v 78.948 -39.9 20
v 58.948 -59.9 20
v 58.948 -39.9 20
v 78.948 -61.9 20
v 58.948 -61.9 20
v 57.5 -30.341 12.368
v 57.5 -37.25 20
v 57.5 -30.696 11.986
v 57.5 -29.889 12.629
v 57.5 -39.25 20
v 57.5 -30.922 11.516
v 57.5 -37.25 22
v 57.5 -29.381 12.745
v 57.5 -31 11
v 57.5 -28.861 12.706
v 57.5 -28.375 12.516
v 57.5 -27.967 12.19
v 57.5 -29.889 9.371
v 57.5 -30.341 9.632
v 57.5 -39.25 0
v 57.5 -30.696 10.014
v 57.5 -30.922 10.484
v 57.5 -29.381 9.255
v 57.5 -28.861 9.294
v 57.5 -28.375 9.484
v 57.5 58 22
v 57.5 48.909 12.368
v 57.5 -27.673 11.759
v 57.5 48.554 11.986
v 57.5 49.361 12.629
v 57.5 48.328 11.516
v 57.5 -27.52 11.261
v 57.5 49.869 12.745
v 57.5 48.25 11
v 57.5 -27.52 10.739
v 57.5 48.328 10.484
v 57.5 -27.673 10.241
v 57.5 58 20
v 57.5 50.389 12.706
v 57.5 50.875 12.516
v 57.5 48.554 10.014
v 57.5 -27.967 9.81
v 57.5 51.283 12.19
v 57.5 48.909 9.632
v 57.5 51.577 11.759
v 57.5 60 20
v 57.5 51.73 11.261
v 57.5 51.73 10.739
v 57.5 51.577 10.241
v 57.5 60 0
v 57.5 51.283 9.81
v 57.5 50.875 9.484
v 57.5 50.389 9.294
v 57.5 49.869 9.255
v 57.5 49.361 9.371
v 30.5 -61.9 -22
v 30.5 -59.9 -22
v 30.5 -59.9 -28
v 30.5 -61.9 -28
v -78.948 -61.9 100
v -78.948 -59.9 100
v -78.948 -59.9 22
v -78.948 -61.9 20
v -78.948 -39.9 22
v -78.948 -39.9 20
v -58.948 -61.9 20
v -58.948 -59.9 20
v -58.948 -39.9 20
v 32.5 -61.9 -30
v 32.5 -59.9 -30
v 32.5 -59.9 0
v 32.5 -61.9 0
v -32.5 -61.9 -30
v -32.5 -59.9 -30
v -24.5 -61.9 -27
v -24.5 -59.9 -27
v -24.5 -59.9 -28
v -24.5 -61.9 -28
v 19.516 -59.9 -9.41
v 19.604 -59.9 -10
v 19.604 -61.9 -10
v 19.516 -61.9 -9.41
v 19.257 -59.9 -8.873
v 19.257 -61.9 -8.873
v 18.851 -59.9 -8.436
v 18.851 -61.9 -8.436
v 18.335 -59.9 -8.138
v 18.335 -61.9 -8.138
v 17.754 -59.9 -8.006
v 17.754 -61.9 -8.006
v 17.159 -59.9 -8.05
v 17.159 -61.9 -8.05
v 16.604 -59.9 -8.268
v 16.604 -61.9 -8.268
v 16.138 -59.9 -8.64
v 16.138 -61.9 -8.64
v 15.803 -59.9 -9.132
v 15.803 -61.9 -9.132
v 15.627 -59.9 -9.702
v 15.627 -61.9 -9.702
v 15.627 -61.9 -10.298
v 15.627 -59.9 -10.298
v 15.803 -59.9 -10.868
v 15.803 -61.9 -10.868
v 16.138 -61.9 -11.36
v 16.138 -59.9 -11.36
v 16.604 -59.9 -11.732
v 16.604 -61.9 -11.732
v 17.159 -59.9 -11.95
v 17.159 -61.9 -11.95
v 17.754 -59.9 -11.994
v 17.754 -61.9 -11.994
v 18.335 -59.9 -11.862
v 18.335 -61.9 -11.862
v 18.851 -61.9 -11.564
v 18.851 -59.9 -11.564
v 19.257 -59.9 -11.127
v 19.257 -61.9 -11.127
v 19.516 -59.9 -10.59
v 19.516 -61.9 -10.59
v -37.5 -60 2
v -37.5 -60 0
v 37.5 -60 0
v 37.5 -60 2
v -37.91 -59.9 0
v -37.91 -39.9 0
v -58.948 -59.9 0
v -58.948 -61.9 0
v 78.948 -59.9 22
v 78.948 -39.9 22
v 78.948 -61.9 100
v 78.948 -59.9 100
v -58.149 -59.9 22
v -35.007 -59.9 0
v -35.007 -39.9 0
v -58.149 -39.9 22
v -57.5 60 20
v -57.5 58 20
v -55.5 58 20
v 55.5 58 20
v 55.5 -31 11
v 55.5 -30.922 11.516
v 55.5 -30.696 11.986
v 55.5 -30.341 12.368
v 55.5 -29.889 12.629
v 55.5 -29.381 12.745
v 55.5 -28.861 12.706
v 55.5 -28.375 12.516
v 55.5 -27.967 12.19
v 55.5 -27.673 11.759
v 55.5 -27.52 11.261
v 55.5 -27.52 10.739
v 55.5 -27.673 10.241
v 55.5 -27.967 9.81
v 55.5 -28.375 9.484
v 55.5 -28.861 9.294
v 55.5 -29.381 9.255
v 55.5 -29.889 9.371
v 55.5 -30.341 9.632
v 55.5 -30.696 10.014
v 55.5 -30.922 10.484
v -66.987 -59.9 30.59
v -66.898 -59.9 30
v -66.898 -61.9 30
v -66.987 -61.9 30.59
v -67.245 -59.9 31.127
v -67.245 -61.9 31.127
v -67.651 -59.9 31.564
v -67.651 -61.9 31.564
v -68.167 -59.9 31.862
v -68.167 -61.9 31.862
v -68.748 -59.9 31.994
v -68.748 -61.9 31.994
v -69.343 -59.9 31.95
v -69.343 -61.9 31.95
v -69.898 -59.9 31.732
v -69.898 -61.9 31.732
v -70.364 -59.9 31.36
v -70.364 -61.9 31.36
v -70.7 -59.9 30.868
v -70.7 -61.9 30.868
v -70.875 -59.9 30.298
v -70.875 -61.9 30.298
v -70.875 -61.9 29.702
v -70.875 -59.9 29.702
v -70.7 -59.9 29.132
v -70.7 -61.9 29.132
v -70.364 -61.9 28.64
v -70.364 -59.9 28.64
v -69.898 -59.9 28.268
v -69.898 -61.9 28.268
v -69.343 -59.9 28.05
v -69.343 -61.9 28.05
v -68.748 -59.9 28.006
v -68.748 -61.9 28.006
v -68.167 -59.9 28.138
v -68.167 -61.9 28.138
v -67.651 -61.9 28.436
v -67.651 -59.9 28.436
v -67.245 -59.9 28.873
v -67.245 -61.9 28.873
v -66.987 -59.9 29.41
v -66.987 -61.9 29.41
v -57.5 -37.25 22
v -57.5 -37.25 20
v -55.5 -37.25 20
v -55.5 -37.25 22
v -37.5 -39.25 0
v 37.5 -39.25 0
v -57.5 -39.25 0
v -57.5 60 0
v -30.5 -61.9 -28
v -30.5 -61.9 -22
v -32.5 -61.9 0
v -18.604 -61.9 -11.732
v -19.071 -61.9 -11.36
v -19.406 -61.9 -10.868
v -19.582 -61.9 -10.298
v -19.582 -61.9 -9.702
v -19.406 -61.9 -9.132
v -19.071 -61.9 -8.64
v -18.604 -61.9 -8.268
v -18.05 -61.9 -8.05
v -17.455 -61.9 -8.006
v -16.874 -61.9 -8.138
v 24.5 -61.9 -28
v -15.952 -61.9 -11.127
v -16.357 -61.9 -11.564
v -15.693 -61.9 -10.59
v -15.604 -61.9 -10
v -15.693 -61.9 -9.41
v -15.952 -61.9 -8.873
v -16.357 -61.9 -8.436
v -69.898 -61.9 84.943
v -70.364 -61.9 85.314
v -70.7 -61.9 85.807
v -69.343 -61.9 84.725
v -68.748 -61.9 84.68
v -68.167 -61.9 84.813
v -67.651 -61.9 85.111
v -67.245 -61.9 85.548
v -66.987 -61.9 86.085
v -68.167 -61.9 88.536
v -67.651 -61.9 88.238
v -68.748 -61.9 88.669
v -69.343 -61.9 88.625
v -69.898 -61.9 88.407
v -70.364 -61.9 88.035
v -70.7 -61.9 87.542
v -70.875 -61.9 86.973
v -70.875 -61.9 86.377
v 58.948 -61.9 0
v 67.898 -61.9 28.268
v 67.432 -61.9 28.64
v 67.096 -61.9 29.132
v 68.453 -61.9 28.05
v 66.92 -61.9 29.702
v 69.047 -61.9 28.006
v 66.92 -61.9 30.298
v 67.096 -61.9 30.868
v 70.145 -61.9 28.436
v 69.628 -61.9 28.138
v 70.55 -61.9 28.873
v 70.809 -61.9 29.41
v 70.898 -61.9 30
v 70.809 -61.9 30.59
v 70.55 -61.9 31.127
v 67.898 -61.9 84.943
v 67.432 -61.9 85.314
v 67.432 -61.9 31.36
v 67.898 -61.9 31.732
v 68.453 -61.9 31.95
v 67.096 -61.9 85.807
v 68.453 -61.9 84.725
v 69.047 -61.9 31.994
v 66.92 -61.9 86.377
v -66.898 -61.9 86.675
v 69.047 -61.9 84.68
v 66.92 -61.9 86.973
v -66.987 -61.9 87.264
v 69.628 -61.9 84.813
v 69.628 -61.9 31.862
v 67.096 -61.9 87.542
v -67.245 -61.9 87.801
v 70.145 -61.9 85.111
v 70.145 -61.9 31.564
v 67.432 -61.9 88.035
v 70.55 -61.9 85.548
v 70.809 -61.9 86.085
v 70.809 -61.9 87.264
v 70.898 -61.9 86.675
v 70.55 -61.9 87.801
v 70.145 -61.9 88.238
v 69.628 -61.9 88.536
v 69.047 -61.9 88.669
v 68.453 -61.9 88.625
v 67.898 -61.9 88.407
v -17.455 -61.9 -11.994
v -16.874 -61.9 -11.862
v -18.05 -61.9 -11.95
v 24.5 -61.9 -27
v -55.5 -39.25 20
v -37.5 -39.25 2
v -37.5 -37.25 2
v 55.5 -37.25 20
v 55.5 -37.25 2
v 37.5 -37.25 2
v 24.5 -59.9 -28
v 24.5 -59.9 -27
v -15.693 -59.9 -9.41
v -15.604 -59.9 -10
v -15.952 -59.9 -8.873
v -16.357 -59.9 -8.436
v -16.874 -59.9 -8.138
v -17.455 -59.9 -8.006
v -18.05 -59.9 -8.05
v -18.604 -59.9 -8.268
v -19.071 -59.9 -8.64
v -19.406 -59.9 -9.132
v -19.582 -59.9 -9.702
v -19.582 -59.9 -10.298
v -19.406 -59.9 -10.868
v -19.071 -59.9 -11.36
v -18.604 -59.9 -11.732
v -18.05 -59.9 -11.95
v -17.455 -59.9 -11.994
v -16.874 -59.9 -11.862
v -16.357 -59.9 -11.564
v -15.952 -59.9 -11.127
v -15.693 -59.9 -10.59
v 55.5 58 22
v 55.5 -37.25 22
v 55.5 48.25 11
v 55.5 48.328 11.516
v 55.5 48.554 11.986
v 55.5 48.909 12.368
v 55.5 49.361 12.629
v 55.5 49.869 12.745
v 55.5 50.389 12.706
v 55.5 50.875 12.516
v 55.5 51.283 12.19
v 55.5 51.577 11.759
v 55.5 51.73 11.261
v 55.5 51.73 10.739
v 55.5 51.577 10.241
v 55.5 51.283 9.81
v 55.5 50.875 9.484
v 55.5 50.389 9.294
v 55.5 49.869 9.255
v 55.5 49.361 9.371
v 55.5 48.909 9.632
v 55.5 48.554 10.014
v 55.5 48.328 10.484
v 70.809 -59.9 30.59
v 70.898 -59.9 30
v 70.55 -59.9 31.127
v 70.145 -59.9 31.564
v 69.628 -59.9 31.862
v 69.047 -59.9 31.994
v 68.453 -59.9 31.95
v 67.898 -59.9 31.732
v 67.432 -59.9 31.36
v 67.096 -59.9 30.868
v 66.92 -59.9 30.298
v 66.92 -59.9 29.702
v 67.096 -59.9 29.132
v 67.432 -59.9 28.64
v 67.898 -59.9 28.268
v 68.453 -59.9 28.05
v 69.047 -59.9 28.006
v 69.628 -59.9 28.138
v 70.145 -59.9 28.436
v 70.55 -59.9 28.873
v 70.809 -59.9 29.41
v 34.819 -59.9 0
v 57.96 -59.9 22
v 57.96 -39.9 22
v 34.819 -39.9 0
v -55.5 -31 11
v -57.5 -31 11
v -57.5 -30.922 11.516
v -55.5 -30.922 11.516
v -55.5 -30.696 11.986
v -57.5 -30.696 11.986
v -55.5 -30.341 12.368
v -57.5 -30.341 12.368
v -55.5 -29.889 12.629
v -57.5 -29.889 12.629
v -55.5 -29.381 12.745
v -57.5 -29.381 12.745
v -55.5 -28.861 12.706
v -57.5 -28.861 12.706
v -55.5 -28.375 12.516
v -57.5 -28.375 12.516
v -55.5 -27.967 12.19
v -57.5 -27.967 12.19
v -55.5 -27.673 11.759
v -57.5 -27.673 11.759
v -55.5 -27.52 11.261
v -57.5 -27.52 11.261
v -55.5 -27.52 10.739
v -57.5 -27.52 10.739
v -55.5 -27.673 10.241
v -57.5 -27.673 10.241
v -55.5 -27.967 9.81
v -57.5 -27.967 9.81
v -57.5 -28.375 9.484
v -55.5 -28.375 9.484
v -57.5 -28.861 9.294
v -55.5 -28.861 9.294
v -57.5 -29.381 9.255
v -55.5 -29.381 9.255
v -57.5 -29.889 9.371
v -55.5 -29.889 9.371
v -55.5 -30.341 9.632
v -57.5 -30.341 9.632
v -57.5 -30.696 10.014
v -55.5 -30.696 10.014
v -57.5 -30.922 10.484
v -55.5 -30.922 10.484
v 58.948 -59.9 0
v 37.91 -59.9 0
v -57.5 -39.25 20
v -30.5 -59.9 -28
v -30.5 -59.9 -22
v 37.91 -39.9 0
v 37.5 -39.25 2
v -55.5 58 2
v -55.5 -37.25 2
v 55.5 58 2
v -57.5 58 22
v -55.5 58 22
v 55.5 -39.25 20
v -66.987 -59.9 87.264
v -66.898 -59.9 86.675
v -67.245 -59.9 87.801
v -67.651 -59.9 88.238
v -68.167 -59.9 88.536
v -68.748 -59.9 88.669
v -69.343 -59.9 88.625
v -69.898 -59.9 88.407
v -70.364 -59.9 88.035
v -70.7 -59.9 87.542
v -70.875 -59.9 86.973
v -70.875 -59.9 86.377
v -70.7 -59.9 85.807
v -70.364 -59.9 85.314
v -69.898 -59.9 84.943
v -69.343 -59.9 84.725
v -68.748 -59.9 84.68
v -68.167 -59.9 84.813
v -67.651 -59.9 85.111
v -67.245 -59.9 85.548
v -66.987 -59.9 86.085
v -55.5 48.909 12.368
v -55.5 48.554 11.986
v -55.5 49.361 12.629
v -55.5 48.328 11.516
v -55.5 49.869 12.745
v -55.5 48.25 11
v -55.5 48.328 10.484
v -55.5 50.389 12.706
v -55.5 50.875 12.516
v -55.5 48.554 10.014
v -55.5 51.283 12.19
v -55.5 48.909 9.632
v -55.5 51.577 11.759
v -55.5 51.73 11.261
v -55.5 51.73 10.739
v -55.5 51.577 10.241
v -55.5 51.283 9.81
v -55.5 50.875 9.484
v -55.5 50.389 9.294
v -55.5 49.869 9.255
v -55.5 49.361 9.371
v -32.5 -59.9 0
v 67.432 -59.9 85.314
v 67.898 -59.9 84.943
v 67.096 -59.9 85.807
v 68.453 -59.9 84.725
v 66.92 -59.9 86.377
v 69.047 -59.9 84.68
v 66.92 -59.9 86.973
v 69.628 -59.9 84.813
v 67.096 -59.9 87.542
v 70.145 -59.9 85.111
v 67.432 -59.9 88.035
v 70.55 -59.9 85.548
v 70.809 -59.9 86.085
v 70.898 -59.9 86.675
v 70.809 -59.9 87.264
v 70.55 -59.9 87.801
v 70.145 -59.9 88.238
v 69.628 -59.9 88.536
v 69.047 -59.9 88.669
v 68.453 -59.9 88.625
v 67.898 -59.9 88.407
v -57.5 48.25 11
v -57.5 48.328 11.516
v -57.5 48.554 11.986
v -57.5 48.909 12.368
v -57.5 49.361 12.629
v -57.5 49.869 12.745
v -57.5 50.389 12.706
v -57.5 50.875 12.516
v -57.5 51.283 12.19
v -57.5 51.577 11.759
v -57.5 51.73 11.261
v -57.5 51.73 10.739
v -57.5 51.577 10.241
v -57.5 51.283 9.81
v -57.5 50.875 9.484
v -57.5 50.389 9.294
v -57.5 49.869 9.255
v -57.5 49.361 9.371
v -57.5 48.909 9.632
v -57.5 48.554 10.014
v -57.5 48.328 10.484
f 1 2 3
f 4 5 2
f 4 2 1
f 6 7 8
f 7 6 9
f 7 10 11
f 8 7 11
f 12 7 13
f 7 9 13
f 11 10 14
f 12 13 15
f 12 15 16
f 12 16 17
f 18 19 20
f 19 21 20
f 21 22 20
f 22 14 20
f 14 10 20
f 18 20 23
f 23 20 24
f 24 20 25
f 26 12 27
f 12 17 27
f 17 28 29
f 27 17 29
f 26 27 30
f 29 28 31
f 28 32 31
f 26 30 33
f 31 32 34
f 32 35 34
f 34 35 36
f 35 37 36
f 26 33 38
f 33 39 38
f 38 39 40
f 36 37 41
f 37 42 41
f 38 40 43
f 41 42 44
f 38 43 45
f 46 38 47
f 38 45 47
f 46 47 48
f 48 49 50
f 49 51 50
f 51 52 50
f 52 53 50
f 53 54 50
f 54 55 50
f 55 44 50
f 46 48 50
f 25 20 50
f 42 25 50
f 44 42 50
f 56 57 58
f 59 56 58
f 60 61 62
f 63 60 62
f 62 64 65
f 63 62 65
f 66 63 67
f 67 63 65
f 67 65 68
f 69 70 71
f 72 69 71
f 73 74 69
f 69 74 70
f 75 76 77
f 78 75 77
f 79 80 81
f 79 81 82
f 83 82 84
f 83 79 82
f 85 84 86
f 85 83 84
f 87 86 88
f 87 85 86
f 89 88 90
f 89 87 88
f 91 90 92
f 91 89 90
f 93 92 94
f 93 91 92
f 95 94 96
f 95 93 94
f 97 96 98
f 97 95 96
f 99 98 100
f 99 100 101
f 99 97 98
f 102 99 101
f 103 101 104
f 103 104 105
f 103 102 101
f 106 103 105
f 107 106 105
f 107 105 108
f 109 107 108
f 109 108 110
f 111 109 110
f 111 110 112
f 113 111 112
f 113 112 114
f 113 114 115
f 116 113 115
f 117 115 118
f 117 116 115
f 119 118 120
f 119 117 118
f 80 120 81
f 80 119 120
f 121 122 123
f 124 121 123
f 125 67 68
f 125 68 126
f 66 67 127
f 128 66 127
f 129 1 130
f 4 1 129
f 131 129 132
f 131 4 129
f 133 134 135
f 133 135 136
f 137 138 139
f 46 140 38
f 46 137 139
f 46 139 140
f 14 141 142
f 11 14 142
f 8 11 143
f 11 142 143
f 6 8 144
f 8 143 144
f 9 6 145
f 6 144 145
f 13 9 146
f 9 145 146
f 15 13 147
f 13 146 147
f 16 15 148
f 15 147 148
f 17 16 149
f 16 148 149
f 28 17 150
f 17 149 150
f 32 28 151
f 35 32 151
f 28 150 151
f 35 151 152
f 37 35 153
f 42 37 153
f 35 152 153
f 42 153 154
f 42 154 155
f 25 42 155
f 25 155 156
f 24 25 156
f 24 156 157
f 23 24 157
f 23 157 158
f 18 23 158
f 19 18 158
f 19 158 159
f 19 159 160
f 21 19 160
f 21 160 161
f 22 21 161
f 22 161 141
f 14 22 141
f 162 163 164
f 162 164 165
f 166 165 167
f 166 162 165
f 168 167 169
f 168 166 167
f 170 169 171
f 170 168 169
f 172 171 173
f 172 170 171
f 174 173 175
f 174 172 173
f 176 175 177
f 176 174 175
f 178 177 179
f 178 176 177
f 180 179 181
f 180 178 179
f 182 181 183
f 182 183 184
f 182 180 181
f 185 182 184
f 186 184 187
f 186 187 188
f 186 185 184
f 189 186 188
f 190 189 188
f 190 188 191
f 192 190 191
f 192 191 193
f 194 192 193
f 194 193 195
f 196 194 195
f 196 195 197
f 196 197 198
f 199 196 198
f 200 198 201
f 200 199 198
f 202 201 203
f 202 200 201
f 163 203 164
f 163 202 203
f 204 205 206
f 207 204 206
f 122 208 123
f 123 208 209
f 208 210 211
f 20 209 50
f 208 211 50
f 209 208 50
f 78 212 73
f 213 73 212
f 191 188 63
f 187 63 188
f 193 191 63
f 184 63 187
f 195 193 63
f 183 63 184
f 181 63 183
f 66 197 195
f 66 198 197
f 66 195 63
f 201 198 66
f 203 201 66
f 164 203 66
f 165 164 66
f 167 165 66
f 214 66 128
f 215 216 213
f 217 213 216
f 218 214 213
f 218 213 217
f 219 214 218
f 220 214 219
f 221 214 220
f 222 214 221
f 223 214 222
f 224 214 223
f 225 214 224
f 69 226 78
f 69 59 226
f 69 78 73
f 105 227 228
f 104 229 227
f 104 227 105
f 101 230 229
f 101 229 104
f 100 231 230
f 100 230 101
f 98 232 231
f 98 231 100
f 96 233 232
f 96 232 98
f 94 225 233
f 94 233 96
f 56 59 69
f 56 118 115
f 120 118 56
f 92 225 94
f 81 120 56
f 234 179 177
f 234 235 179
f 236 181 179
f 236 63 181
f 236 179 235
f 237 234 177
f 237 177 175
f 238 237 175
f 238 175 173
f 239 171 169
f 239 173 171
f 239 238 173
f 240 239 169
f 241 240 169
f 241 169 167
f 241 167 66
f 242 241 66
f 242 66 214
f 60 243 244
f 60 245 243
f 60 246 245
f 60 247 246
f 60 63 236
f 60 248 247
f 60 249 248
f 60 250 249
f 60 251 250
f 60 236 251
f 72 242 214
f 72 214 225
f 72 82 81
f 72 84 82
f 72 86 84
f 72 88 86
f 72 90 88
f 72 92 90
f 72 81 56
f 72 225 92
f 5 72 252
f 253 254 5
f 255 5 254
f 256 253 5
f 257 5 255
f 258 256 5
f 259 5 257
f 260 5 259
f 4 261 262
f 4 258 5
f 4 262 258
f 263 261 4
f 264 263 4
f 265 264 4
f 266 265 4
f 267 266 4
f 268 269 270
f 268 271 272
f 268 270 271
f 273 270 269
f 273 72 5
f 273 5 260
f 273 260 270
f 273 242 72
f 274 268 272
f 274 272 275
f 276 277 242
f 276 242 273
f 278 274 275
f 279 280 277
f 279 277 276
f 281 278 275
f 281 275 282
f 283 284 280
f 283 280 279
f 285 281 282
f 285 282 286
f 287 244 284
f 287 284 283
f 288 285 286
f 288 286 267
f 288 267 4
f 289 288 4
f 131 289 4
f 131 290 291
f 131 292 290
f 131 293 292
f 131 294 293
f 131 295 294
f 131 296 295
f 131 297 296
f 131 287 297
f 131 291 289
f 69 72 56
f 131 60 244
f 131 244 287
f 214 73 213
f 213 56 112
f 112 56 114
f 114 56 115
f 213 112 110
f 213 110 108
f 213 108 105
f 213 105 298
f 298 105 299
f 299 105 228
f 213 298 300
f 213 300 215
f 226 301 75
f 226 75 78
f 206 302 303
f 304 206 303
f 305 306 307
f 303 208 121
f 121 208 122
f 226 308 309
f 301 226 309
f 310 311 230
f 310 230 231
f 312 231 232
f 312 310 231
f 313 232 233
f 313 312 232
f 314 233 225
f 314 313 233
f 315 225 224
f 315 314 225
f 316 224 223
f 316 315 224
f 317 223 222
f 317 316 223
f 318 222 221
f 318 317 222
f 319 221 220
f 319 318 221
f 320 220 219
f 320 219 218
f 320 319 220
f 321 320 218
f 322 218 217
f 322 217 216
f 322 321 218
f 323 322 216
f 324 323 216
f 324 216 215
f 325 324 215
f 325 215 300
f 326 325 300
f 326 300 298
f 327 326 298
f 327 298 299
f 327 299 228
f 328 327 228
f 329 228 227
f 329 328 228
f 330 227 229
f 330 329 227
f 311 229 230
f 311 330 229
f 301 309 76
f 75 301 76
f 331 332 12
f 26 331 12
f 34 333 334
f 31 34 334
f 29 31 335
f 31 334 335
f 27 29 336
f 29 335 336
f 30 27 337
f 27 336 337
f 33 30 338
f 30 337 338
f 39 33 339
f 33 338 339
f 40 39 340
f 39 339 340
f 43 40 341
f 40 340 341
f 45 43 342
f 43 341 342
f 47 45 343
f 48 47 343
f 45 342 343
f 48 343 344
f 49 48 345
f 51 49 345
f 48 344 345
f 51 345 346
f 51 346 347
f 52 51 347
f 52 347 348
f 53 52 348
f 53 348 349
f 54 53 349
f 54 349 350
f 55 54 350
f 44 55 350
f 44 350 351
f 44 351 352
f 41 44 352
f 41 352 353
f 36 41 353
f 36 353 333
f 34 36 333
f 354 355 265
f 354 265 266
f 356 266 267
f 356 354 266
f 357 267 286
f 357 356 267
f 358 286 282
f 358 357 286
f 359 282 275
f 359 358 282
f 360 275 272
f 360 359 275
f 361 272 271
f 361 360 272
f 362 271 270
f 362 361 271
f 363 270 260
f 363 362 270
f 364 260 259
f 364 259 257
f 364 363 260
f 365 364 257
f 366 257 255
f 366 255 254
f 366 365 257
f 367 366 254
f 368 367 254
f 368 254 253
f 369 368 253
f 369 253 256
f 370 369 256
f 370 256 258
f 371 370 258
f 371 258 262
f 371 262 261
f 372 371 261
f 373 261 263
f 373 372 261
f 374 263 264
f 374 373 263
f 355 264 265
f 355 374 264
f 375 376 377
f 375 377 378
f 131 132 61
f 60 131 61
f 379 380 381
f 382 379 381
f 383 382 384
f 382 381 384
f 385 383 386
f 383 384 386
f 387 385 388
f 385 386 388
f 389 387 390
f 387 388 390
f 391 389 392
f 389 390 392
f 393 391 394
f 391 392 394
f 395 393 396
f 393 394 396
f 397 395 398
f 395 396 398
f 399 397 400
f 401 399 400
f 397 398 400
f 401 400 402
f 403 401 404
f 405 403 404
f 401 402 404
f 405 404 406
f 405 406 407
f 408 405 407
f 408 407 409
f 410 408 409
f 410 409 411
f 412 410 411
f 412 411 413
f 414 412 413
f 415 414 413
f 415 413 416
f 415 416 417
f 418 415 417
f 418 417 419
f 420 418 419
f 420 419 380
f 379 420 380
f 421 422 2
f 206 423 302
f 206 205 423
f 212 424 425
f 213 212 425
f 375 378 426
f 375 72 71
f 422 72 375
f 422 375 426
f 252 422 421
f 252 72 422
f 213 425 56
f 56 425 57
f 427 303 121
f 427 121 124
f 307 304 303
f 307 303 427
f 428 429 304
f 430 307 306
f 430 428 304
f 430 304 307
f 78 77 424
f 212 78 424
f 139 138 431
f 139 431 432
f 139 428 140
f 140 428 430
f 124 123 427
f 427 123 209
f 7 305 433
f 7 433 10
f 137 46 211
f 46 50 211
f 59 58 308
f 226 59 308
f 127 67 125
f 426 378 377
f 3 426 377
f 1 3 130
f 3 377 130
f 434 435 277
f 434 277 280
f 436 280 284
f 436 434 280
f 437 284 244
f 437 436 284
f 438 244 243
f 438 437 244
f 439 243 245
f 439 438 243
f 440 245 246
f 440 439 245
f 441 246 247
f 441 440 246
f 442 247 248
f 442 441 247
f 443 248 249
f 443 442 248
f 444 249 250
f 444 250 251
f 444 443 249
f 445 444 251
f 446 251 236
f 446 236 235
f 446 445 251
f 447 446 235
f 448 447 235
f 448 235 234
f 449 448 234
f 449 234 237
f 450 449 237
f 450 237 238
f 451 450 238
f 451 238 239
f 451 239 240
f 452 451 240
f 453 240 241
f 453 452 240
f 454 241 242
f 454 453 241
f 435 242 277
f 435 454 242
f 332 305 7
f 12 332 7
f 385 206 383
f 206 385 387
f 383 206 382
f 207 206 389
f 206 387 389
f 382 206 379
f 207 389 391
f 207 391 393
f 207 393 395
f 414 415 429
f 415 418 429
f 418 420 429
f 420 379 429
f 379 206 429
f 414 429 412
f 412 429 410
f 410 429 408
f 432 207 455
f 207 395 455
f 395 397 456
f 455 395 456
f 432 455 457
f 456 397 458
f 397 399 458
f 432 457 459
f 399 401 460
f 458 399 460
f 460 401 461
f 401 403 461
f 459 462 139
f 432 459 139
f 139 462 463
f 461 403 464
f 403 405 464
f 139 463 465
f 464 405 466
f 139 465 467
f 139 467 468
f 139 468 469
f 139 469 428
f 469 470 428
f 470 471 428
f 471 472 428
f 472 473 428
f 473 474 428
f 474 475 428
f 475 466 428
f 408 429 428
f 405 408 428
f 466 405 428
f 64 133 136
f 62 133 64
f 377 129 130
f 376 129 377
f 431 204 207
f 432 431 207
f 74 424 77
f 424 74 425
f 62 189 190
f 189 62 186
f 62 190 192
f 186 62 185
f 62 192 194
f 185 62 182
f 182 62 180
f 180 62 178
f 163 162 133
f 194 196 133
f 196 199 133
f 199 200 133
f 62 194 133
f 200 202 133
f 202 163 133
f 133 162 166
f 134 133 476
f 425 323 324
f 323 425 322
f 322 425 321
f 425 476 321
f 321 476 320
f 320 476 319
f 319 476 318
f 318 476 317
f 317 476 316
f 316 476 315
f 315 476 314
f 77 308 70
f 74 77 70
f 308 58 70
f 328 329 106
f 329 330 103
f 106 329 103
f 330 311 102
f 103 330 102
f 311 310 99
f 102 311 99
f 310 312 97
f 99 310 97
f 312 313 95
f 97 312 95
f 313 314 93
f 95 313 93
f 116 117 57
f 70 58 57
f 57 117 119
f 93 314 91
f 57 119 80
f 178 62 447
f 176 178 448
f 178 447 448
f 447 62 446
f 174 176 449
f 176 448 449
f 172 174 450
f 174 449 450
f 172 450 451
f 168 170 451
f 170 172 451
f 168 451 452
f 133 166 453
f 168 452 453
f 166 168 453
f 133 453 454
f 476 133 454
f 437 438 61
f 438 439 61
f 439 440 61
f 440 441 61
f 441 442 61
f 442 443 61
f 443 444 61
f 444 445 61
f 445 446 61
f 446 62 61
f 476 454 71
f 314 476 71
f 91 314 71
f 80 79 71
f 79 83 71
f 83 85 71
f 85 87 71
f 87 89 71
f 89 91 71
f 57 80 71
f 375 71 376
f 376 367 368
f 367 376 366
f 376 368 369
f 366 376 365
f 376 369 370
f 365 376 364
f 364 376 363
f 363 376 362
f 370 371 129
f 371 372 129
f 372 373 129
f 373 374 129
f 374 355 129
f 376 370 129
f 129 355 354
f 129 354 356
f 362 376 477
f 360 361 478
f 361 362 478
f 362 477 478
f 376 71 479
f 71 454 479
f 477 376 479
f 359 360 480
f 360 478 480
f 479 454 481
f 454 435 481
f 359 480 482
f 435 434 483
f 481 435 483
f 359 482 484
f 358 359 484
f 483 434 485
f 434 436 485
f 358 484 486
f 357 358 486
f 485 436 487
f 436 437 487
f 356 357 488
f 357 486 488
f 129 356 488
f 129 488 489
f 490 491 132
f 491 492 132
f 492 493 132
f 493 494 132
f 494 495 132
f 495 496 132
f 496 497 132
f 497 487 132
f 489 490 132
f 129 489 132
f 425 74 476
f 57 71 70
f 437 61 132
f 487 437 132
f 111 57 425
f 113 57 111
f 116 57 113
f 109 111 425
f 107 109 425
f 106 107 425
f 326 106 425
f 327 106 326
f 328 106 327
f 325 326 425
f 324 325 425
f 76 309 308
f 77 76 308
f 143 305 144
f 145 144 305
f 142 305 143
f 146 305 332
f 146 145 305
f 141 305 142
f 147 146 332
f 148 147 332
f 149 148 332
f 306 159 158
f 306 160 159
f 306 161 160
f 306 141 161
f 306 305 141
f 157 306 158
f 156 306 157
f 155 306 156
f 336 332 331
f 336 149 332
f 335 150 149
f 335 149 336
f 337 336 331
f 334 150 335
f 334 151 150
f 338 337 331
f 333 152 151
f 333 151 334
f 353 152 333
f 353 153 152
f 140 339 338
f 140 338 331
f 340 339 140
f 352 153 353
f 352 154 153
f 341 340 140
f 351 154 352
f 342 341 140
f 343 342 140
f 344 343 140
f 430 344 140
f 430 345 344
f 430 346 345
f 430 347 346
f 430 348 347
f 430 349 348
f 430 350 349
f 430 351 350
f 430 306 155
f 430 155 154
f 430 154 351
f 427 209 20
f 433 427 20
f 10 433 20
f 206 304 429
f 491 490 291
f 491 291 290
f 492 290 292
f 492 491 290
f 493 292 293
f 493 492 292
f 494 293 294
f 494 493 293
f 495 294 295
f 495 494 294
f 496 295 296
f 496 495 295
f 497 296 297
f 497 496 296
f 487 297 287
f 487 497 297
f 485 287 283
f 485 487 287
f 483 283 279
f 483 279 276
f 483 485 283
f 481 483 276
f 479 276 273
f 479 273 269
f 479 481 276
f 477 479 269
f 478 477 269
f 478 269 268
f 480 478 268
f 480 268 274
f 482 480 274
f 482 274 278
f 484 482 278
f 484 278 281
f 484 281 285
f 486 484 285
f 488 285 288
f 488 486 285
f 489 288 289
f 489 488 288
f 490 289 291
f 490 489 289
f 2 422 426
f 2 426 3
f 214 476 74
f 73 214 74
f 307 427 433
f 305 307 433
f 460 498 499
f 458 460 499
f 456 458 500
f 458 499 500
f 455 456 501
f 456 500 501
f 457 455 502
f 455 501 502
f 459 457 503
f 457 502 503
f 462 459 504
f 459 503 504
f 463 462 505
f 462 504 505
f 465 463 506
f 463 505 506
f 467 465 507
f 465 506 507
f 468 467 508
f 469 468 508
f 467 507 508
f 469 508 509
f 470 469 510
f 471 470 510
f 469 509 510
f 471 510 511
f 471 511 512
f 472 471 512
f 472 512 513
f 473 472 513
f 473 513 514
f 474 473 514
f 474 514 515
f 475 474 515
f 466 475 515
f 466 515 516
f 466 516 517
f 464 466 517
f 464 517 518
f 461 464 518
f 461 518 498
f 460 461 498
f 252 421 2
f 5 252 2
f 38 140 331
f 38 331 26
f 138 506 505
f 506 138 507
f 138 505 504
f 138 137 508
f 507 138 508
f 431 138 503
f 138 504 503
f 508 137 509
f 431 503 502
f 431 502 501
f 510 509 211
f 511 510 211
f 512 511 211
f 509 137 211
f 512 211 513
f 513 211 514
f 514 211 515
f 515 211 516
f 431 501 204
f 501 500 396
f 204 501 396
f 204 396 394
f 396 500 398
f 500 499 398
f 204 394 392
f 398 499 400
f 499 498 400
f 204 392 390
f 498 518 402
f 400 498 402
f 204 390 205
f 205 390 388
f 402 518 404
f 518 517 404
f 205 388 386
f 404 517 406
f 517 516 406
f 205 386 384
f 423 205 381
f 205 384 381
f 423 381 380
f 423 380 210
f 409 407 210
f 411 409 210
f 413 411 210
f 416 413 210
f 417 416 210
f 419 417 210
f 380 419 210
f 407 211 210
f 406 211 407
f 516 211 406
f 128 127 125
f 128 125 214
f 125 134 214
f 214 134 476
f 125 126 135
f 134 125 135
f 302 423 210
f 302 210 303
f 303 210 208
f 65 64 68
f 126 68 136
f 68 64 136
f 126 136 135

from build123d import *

# Parameters (mm, degrees)
F2_DEPTH  = 2
F4_DEPTH  = 18
F6_DEPTH  = 2
F7_R      = 1.75
F8_DEPTH  = 115.001
F9_W      = 2
F9_H      = 95.25
F10_DEPTH = 2
F12_R     = 2
F13_DEPTH = 2
F14_DEPTH = 20


with BuildPart() as f2:
    # F1 (on Top) → F2 (new body)
    with BuildSketch(Plane.XY):
        Polygon((-37.5, -60), (37.5, -60), (37.5, -39.25), (57.5, -39.25), (57.5, 60), (0, 60), (-57.5, 60), (-57.5, -39.25), (-37.5, -39.25), align=None)
    extrude(amount=F2_DEPTH)

    # F3 (on face) → F4 (join)
    with BuildSketch(Plane.XY.offset(2)):
        Polygon((-55.5, -37.25), (-55.5, 58), (55.5, 58), (55.5, -37.25), (37.5, -37.25), (37.5, -39.25), (57.5, -39.25), (57.5, 60), (0, 60), (-57.5, 60), (-57.5, -39.25), (-37.5, -39.25), (-37.5, -37.25), align=None)
    extrude(amount=F4_DEPTH)

    # F5 (on face) → F6 (cut, through all)
    with BuildSketch(Plane.XZ.offset(39.25)):
        Polygon((-37.5, 2), (-37.5, 20), (-55.5, 20), align=None)
        Polygon((55.5, 20), (37.5, 20), (37.5, 2), align=None)
    extrude(amount=-F6_DEPTH, mode=Mode.SUBTRACT)

    # F7 (on face) → F8 (cut, through all)
    with BuildSketch(Plane(origin=(-57.5, 0, 0), x_dir=(0, -1, 0), z_dir=(-1, 0, 0))):
        with Locations((-50, 11)):
            Circle(F7_R)
        with Locations((29.25, 11)):
            Circle(F7_R)
    extrude(amount=-F8_DEPTH, mode=Mode.SUBTRACT)

    # F9 (on face) → F10 (join)
    with BuildSketch(Plane.XY.offset(20)):
        with Locations((56.5, 10.375)):
            Rectangle(F9_W, F9_H)
        with Locations((-56.5, 10.375)):
            Rectangle(F9_W, F9_H)
    extrude(amount=F10_DEPTH)


with BuildPart() as f13:
    # F12 (on offset) → F13 (new body)
    with BuildSketch(Plane.XZ.offset(59.9)):
        Polygon((-32.5, -0.1356871004), (-32.5, -30), (32.5, -30), (32.5, 0), (34.8185987762, 0), (57.9599612257, 22), (58.1487305462, 22), (78.9476944018, 22), (78.9476944018, 100), (0, 100), (-78.9476944018, 100), (-78.9476944018, 22), (-58.1487305462, 22), (-35.0073680967, 0), (-32.5, 0), align=None)
        with Locations((-17.6044665277, -10)):
            Circle(F12_R, mode=Mode.SUBTRACT)
        with Locations((-68.8976944018, 30)):
            Circle(F12_R, mode=Mode.SUBTRACT)
        Polygon((-30.5, -28), (-30.5, -27), (-30.5, -22), (30.5, -22), (30.5, -27), (30.5, -28), (24.5, -28), (24.5, -27), (-24.5, -27), (-24.5, -28), align=None, mode=Mode.SUBTRACT)
        with Locations((17.6044665277, -10)):
            Circle(F12_R, mode=Mode.SUBTRACT)
        with Locations((68.8976944018, 30)):
            Circle(F12_R, mode=Mode.SUBTRACT)
        with Locations((-68.8976944018, 86.6746587008)):
            Circle(F12_R, mode=Mode.SUBTRACT)
        with Locations((68.8976944018, 86.6746587008)):
            Circle(F12_R, mode=Mode.SUBTRACT)
        Polygon((57.9599612257, 22), (34.8185987762, 0), (37.910092175, 0), (58.9476944018, 20), (78.9476944018, 20), (78.9476944018, 22), (58.1487305462, 22), align=None)
        Polygon((-37.910092175, 0), (-35.0073680967, 0), (-58.1487305462, 22), (-78.9476944018, 22), (-78.9476944018, 20), (-58.9476944018, 20), align=None)
        Polygon((58.9476944018, 20), (37.910092175, 0), (58.9476944018, 0), align=None)
        Polygon((-58.9476944018, 0), (-37.910092175, 0), (-58.9476944018, 20), align=None)
    extrude(amount=F13_DEPTH)

    # F12 (on offset) → F14 (join)
    with BuildSketch(Plane.XZ.offset(59.9)):
        Polygon((57.9599612257, 22), (34.8185987762, 0), (37.910092175, 0), (58.9476944018, 20), (78.9476944018, 20), (78.9476944018, 22), (58.1487305462, 22), align=None)
        Polygon((-37.910092175, 0), (-35.0073680967, 0), (-58.1487305462, 22), (-78.9476944018, 22), (-78.9476944018, 20), (-58.9476944018, 20), align=None)
    extrude(amount=-F14_DEPTH)


solid = Compound([f2.part, f13.part])
